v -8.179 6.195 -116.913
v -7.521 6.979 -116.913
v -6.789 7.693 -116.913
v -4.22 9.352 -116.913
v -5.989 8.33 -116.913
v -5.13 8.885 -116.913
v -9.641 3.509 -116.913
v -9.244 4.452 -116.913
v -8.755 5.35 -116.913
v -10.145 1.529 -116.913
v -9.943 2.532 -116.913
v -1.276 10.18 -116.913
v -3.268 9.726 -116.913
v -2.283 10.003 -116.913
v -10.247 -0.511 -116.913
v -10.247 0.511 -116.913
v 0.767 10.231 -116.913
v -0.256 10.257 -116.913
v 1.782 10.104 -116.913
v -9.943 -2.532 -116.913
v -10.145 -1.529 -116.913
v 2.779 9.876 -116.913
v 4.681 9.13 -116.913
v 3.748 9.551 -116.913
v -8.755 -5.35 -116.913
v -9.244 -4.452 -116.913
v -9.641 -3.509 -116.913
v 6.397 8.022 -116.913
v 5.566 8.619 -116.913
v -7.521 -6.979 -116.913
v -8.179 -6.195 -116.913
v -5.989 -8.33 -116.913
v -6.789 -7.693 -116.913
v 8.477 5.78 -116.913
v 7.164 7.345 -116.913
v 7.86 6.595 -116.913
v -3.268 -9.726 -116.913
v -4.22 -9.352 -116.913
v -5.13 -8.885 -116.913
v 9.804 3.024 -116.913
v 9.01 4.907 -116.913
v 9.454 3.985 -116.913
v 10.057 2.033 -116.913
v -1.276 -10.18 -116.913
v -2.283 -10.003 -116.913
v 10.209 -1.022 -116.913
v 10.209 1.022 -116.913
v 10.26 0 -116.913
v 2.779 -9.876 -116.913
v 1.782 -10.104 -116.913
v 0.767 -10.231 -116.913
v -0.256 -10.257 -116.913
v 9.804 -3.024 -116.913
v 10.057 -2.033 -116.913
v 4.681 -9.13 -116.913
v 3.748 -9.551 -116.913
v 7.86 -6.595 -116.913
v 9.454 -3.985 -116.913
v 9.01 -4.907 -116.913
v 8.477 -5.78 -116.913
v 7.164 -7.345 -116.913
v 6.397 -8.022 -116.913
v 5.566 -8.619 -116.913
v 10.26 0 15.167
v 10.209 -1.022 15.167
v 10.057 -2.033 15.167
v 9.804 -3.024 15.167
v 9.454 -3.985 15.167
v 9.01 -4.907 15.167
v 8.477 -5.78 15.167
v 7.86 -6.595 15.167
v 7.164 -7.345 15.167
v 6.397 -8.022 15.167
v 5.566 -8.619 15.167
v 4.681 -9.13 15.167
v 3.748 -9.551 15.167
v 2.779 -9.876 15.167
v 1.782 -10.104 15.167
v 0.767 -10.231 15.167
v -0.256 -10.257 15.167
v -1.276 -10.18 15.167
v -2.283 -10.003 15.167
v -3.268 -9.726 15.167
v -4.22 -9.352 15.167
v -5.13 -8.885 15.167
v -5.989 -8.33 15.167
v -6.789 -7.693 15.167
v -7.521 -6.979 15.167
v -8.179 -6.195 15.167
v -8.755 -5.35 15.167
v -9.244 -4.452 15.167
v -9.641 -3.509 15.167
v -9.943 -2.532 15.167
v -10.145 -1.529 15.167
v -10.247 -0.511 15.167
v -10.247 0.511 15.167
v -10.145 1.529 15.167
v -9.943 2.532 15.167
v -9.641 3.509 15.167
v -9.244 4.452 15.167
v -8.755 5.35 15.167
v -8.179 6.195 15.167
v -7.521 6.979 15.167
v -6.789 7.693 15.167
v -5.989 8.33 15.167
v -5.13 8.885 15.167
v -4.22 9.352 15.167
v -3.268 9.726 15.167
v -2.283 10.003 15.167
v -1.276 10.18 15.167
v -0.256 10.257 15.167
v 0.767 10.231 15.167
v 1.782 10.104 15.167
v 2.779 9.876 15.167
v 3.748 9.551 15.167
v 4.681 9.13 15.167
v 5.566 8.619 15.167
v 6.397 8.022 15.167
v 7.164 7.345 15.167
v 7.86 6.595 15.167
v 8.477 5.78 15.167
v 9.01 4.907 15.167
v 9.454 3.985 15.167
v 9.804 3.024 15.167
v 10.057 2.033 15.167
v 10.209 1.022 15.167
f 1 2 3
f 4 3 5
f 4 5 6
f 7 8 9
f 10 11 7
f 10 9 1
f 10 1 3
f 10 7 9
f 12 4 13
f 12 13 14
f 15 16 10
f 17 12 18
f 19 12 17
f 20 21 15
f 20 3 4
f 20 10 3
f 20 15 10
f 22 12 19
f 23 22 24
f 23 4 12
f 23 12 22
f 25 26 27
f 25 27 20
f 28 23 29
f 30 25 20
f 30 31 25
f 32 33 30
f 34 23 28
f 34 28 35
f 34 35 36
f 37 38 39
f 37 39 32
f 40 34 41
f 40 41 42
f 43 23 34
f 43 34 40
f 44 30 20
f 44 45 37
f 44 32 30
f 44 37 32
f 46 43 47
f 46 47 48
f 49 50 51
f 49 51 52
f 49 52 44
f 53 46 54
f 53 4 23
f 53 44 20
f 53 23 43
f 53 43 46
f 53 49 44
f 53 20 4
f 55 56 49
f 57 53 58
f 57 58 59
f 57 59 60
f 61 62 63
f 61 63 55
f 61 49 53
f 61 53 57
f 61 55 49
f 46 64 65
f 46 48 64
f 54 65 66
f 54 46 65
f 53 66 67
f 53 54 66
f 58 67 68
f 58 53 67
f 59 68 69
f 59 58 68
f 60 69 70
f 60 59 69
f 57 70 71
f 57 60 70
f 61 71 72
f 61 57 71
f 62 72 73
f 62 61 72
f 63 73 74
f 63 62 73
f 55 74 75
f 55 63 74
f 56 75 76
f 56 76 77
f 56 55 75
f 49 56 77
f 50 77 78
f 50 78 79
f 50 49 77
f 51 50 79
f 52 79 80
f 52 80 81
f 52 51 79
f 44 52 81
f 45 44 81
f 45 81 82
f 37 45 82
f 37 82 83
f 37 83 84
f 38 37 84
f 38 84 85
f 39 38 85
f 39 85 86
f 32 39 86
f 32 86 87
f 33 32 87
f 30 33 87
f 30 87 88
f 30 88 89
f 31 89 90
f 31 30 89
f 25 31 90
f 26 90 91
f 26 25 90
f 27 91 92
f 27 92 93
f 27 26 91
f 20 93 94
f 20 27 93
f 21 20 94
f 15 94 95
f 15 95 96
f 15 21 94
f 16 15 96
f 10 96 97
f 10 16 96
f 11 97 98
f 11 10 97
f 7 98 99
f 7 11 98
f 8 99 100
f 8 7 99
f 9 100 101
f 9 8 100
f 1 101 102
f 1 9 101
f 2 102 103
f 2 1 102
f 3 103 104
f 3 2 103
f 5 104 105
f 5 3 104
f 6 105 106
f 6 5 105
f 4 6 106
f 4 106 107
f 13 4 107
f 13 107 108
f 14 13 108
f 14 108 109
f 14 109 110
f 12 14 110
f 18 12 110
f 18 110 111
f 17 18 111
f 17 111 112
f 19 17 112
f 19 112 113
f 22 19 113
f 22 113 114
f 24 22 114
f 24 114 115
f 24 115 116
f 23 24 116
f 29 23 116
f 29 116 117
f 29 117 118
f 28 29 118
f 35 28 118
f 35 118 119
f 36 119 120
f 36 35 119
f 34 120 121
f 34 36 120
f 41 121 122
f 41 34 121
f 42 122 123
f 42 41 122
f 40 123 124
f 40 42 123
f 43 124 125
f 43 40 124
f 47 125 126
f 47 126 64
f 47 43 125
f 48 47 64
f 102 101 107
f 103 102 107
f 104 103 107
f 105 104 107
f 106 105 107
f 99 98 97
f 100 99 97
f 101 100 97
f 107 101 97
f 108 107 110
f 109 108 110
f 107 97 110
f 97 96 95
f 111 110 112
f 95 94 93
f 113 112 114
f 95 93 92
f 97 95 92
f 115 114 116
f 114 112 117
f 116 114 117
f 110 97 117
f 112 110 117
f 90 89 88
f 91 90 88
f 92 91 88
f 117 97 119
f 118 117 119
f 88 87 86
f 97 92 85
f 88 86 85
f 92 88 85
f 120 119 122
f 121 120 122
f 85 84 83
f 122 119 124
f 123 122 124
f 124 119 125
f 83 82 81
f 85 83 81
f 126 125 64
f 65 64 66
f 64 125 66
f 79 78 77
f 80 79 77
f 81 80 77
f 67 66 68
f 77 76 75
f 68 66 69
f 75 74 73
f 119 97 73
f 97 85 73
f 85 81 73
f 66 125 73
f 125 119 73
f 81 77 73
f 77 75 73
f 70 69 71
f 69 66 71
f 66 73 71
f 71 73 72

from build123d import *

# Parameters (mm, degrees)
F1_DEPTH  = 12.7
F2_DEPTH  = 12.7
F3_R      = 10.2599361316
F4_DEPTH  = 127
F5_DEPTH  = 25.4
F6_DEPTH  = 12.7
F7_DEPTH  = 2.54
F8_DEPTH  = 25.4
F9_DEPTH  = 25.4
F10_DEPTH = 5.08


with BuildPart() as f1:
    # F0 (on Front) → F1 (new body)
    with BuildSketch(Plane.XZ):
        Polygon((28.0411653221, -5.1526171155), (28.0411653221, 20.8860766143), (16.4345689118, 20.8860766143), (-16.3516514003, 20.8860766143), (-27.6816412807, 20.8860766143), (-27.6816412807, -5.1526171155), align=None)
        Polygon((16.4345689118, 20.8860766143), (28.0411653221, 20.8860766143), (36.4657826722, 27.4914167821), (42.8281202912, 10.9493397176), (91.7288586497, 81.2863186002), (43.9798757434, 34.9366031587), (42.0971289277, 52.180416882), align=None)
        Polygon((-27.6816412807, 20.8860766143), (-16.3516514003, 20.8860766143), (-42.1405397356, 52.1064698696), (-43.9977906644, 34.9366031587), (-91.8636098504, 81.2863186002), (-42.8677536547, 10.9493397176), (-36.362465471, 27.4914167821), align=None)
    extrude(amount=F1_DEPTH)

    # F2 (add): a face of the model
    f2_faces = [f1.faces().sort_by_distance(p)[0] for p in [
        (26.0119318683, 0, 7.8667297494),
    ]]
    extrude(f2_faces, amount=F2_DEPTH)

    # F3 (on face) → F4 (join)
    with BuildSketch(Plane(origin=(0, 0, -5.1526171155), x_dir=(1, 0, 0), z_dir=(0, 0, -1))):
        Circle(F3_R)
    extrude(amount=F4_DEPTH)

    # F5 (cut): a face of the model
    f5_faces = [f1.faces().sort_by_distance(p)[0] for p in [
        (0, 0, -132.1526171155),
    ]]
    extrude(f5_faces, amount=-F5_DEPTH, mode=Mode.SUBTRACT)

    # F6 (add): a face of the model
    f6_faces = [f1.faces().sort_by_distance(p)[0] for p in [
        (0, 0, -106.7526171155),
    ]]
    extrude(f6_faces, amount=F6_DEPTH)

    # F7 (cut): a face of the model
    f7_faces = [f1.faces().sort_by_distance(p)[0] for p in [
        (0, 0, -119.4526171155),
    ]]
    extrude(f7_faces, amount=-F7_DEPTH, mode=Mode.SUBTRACT)

    # F8 (cut): a face of the model
    f8_faces = [f1.faces().sort_by_distance(p)[0] for p in [
        (26.0119318683, -12.7, 7.8667297494),
    ]]
    extrude(f8_faces, amount=-F8_DEPTH, mode=Mode.SUBTRACT)

    # F9 (add): a face of the model
    f9_faces = [f1.faces().sort_by_distance(p)[0] for p in [
        (0, 0, -5.1526171155),
    ]]
    extrude(f9_faces, amount=F9_DEPTH)

    # F10 (cut): a face of the model
    f10_faces = [f1.faces().sort_by_distance(p)[0] for p in [
        (0, 0, 20.2473828845),
    ]]
    extrude(f10_faces, amount=-F10_DEPTH, mode=Mode.SUBTRACT)


solid = f1.part
